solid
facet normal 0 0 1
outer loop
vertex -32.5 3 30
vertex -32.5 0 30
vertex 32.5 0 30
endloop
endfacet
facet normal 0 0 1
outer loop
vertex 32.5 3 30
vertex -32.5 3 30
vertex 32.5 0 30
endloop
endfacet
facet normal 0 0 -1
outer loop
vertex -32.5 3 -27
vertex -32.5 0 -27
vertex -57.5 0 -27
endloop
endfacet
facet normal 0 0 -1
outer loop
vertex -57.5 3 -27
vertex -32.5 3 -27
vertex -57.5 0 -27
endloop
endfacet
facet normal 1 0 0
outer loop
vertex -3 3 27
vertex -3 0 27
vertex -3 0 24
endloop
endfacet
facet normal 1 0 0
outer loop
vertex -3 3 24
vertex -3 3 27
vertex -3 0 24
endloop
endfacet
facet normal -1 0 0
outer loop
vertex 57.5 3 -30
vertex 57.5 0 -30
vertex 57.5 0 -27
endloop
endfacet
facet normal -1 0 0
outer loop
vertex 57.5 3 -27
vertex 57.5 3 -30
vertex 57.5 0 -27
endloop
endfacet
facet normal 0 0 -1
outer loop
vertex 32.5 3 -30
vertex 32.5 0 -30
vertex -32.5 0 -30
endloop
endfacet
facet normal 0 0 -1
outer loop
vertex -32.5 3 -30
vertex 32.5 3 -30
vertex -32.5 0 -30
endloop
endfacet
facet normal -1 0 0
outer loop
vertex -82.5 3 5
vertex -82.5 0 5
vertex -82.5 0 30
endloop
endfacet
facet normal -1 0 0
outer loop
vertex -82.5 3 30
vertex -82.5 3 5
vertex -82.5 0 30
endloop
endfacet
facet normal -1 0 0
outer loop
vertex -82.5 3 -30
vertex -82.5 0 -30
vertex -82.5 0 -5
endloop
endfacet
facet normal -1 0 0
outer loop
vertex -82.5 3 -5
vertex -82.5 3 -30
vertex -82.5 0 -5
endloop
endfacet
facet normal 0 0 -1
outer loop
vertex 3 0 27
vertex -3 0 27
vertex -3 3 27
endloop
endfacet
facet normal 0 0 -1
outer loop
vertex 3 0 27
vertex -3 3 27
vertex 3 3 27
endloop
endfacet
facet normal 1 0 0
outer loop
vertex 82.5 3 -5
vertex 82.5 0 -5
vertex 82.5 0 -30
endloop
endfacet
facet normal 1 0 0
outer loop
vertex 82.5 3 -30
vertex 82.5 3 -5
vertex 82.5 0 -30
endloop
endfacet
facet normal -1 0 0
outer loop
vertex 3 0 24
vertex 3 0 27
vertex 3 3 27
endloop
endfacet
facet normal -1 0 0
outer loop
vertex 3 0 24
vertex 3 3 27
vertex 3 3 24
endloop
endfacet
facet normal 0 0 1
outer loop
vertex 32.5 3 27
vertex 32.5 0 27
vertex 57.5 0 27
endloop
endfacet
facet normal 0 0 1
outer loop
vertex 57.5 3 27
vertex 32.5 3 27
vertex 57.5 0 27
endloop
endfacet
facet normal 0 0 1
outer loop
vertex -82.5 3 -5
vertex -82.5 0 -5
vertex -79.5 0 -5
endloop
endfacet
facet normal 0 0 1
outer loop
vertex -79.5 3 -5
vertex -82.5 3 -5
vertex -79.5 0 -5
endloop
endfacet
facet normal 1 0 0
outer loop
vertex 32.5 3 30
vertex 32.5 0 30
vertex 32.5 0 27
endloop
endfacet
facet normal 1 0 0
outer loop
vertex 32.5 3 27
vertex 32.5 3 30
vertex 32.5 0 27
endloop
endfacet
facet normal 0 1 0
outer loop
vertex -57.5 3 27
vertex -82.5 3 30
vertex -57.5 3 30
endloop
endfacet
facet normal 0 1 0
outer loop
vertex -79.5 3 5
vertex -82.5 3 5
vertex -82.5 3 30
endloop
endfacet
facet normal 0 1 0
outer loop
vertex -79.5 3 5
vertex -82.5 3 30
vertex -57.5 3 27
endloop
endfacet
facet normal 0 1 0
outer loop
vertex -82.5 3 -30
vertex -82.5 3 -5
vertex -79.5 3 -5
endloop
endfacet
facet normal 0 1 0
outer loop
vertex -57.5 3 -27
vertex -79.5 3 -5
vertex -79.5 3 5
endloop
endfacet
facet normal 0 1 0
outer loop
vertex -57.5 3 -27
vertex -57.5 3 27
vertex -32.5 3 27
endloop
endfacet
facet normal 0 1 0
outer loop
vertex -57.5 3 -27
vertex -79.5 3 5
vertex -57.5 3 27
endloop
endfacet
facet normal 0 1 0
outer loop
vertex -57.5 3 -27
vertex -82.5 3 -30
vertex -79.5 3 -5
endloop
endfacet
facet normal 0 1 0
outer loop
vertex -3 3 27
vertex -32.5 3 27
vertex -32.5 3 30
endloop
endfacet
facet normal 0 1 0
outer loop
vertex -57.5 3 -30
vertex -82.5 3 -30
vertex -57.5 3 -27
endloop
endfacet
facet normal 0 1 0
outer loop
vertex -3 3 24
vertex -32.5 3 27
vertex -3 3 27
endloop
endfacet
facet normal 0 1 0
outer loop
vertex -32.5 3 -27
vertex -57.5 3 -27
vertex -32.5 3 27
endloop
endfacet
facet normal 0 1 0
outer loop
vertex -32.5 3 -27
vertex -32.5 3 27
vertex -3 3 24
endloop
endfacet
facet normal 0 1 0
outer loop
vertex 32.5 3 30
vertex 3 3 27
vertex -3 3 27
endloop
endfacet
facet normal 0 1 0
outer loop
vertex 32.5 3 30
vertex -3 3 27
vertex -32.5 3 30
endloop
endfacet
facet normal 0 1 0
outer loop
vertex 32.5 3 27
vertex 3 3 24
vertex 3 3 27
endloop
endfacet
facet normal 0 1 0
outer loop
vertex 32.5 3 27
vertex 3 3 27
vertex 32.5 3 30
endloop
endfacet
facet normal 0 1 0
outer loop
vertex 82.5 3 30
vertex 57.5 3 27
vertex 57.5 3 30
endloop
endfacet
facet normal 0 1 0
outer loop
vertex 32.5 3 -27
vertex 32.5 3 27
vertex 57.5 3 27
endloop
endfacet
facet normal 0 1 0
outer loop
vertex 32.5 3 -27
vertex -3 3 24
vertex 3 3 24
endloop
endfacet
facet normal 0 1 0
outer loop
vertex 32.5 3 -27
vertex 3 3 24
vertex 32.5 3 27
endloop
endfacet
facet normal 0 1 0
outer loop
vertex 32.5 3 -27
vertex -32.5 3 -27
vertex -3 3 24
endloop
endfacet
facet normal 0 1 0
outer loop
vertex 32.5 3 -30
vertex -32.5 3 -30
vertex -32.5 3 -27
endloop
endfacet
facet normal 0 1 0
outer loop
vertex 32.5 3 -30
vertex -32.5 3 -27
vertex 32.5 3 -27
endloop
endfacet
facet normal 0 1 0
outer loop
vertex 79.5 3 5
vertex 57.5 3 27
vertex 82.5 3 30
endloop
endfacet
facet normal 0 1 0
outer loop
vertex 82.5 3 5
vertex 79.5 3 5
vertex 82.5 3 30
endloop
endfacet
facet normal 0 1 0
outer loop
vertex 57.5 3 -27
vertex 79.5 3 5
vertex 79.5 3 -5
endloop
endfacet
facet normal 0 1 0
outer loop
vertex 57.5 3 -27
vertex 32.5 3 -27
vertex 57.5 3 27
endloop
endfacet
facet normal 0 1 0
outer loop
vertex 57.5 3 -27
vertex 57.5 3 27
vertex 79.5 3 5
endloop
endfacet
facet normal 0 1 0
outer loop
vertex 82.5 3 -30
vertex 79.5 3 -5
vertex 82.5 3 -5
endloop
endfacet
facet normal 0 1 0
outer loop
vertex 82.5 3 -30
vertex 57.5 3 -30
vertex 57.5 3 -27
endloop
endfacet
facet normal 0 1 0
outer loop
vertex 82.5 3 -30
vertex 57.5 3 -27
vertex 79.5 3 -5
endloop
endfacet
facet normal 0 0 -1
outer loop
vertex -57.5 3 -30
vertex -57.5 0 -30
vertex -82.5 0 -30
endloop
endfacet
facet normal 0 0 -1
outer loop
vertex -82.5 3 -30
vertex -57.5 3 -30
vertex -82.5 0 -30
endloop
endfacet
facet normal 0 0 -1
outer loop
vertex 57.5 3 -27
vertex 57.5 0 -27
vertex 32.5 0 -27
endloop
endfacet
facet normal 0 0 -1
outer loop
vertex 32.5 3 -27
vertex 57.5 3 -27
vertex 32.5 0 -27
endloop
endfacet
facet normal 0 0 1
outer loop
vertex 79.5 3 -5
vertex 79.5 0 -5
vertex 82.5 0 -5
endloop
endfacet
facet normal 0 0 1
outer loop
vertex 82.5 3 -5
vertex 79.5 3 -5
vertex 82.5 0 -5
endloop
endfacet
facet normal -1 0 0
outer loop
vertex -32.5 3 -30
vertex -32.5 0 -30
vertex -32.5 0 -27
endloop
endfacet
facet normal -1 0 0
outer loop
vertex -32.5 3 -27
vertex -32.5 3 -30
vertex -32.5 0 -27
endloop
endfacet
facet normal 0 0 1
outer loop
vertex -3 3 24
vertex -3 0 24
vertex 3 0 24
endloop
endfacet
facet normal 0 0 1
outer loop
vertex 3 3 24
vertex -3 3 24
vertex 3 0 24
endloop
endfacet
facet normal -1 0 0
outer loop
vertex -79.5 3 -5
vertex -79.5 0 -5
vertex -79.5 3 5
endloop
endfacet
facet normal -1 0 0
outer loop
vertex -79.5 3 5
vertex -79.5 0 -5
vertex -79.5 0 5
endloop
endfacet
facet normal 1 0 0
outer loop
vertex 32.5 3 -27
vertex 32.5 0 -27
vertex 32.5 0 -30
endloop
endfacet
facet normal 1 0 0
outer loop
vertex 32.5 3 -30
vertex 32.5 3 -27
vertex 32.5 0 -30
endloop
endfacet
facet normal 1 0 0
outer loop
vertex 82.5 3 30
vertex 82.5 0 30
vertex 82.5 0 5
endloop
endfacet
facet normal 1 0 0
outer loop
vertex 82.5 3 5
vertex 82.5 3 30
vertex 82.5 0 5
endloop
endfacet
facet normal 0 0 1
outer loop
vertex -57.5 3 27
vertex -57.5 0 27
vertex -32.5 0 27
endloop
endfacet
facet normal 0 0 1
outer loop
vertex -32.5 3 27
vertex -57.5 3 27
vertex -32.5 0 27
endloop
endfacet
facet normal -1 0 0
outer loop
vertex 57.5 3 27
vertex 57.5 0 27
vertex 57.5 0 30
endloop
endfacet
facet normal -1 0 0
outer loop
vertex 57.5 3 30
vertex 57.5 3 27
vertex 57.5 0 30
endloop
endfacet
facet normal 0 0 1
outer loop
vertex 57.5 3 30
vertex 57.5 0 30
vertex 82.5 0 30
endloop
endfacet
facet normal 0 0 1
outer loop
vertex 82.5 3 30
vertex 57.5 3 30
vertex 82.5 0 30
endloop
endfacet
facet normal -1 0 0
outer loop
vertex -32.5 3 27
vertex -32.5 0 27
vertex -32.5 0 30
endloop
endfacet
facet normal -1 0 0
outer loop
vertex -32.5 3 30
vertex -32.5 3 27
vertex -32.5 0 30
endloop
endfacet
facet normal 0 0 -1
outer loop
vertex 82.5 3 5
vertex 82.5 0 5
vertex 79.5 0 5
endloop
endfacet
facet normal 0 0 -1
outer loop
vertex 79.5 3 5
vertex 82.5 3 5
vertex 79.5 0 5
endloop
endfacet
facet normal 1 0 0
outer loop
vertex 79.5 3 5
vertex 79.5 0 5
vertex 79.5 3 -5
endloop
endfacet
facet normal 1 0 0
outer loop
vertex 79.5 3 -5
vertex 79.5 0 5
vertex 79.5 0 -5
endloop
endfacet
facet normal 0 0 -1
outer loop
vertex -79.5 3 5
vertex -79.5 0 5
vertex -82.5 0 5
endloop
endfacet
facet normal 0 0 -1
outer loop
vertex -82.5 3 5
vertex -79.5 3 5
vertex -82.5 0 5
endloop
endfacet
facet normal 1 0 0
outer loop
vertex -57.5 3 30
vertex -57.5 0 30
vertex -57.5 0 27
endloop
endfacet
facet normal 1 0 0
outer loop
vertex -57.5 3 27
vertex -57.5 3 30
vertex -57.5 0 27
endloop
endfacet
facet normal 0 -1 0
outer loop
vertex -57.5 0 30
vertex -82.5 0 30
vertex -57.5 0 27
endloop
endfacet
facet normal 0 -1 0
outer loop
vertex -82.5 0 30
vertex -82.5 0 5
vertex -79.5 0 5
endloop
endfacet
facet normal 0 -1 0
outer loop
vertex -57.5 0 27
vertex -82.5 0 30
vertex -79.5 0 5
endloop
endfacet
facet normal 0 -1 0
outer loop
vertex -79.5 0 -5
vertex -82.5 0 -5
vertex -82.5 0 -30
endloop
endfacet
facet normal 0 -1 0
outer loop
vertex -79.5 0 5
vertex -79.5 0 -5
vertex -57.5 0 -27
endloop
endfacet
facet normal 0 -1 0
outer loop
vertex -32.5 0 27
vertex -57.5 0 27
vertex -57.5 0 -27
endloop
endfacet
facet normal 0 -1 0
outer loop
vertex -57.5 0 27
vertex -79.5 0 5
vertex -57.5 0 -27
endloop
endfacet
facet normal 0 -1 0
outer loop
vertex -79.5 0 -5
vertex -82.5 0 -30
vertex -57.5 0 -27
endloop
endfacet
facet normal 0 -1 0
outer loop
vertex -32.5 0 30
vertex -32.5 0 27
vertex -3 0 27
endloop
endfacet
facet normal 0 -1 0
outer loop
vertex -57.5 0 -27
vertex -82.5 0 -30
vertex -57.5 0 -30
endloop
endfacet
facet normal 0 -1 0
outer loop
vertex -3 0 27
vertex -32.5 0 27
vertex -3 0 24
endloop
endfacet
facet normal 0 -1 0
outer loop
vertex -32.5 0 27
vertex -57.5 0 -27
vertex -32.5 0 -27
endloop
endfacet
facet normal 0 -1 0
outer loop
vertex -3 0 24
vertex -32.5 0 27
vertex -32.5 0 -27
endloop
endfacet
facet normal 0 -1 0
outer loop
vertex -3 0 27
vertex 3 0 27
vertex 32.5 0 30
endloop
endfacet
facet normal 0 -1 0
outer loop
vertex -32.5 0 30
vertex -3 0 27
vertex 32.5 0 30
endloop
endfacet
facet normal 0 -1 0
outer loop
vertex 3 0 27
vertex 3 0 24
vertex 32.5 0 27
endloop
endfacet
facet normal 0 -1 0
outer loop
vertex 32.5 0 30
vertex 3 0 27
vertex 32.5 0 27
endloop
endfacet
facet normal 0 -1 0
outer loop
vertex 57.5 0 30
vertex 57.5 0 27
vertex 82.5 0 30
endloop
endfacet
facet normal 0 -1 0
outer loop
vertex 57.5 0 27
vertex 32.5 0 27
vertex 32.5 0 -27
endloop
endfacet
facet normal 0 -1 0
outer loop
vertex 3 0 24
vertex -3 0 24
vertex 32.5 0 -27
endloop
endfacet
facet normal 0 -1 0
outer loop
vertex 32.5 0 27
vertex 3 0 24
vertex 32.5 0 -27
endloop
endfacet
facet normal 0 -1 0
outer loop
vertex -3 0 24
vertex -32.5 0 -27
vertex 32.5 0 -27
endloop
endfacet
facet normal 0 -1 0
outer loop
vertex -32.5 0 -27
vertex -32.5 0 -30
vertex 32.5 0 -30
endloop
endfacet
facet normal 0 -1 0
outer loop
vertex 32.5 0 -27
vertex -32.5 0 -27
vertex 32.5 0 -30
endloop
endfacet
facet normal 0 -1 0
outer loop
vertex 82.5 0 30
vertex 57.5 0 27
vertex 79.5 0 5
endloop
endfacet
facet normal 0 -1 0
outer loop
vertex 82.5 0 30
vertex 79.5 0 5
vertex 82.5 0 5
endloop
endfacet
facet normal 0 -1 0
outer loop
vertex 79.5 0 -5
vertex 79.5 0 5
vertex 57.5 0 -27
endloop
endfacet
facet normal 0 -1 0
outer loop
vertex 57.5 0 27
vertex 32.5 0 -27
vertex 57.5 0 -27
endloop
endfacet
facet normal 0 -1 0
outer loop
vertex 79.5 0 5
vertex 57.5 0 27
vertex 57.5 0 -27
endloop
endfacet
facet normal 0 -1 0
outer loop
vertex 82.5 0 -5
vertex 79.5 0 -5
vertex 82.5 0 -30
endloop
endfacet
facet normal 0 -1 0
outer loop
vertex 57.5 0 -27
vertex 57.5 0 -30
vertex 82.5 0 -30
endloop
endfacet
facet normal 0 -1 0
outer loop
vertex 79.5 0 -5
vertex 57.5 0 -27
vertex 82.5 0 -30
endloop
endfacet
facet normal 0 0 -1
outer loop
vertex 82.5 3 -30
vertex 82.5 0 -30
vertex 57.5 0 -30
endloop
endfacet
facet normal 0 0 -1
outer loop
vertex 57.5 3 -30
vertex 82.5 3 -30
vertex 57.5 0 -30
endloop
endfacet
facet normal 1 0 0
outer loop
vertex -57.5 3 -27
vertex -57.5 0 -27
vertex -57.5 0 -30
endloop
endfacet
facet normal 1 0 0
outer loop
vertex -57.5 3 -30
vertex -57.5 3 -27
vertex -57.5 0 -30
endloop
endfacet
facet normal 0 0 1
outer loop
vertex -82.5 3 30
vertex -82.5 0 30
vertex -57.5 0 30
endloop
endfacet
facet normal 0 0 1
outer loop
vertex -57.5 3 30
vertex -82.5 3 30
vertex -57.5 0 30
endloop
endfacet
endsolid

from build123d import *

# Parameters (mm, degrees)
SKETCH1_W           = 6
SKETCH1_H           = 3
BOSS_EXTRUDE2_DEPTH = 3


with BuildPart() as part:
    # Sketch1 → Boss-Extrude2 (new body)
    with BuildSketch(Plane(origin=(0, 0, 0), x_dir=(1, 0, 0), z_dir=(0, 1, 0))):
        Polygon((-57.5, 30), (-82.5, 30), (-82.5, 5), (-79.5, 5), (-79.5, -5), (-82.5, -5), (-82.5, -30), (-57.5, -30), (-57.5, -27), (-32.5, -27), (-32.5, -30), (32.5, -30), (32.5, -27), (57.5, -27), (57.5, -30), (82.5, -30), (82.5, -5), (79.5, -5), (79.5, 5), (82.5, 5), (82.5, 30), (57.5, 30), (57.5, 27), (32.5, 27), (32.5, 30), (-32.5, 30), (-32.5, 27), (-57.5, 27), align=None)
        with Locations((0, -25.5)):
            Rectangle(SKETCH1_W, SKETCH1_H, mode=Mode.SUBTRACT)
    extrude(amount=BOSS_EXTRUDE2_DEPTH)


solid = part.part
